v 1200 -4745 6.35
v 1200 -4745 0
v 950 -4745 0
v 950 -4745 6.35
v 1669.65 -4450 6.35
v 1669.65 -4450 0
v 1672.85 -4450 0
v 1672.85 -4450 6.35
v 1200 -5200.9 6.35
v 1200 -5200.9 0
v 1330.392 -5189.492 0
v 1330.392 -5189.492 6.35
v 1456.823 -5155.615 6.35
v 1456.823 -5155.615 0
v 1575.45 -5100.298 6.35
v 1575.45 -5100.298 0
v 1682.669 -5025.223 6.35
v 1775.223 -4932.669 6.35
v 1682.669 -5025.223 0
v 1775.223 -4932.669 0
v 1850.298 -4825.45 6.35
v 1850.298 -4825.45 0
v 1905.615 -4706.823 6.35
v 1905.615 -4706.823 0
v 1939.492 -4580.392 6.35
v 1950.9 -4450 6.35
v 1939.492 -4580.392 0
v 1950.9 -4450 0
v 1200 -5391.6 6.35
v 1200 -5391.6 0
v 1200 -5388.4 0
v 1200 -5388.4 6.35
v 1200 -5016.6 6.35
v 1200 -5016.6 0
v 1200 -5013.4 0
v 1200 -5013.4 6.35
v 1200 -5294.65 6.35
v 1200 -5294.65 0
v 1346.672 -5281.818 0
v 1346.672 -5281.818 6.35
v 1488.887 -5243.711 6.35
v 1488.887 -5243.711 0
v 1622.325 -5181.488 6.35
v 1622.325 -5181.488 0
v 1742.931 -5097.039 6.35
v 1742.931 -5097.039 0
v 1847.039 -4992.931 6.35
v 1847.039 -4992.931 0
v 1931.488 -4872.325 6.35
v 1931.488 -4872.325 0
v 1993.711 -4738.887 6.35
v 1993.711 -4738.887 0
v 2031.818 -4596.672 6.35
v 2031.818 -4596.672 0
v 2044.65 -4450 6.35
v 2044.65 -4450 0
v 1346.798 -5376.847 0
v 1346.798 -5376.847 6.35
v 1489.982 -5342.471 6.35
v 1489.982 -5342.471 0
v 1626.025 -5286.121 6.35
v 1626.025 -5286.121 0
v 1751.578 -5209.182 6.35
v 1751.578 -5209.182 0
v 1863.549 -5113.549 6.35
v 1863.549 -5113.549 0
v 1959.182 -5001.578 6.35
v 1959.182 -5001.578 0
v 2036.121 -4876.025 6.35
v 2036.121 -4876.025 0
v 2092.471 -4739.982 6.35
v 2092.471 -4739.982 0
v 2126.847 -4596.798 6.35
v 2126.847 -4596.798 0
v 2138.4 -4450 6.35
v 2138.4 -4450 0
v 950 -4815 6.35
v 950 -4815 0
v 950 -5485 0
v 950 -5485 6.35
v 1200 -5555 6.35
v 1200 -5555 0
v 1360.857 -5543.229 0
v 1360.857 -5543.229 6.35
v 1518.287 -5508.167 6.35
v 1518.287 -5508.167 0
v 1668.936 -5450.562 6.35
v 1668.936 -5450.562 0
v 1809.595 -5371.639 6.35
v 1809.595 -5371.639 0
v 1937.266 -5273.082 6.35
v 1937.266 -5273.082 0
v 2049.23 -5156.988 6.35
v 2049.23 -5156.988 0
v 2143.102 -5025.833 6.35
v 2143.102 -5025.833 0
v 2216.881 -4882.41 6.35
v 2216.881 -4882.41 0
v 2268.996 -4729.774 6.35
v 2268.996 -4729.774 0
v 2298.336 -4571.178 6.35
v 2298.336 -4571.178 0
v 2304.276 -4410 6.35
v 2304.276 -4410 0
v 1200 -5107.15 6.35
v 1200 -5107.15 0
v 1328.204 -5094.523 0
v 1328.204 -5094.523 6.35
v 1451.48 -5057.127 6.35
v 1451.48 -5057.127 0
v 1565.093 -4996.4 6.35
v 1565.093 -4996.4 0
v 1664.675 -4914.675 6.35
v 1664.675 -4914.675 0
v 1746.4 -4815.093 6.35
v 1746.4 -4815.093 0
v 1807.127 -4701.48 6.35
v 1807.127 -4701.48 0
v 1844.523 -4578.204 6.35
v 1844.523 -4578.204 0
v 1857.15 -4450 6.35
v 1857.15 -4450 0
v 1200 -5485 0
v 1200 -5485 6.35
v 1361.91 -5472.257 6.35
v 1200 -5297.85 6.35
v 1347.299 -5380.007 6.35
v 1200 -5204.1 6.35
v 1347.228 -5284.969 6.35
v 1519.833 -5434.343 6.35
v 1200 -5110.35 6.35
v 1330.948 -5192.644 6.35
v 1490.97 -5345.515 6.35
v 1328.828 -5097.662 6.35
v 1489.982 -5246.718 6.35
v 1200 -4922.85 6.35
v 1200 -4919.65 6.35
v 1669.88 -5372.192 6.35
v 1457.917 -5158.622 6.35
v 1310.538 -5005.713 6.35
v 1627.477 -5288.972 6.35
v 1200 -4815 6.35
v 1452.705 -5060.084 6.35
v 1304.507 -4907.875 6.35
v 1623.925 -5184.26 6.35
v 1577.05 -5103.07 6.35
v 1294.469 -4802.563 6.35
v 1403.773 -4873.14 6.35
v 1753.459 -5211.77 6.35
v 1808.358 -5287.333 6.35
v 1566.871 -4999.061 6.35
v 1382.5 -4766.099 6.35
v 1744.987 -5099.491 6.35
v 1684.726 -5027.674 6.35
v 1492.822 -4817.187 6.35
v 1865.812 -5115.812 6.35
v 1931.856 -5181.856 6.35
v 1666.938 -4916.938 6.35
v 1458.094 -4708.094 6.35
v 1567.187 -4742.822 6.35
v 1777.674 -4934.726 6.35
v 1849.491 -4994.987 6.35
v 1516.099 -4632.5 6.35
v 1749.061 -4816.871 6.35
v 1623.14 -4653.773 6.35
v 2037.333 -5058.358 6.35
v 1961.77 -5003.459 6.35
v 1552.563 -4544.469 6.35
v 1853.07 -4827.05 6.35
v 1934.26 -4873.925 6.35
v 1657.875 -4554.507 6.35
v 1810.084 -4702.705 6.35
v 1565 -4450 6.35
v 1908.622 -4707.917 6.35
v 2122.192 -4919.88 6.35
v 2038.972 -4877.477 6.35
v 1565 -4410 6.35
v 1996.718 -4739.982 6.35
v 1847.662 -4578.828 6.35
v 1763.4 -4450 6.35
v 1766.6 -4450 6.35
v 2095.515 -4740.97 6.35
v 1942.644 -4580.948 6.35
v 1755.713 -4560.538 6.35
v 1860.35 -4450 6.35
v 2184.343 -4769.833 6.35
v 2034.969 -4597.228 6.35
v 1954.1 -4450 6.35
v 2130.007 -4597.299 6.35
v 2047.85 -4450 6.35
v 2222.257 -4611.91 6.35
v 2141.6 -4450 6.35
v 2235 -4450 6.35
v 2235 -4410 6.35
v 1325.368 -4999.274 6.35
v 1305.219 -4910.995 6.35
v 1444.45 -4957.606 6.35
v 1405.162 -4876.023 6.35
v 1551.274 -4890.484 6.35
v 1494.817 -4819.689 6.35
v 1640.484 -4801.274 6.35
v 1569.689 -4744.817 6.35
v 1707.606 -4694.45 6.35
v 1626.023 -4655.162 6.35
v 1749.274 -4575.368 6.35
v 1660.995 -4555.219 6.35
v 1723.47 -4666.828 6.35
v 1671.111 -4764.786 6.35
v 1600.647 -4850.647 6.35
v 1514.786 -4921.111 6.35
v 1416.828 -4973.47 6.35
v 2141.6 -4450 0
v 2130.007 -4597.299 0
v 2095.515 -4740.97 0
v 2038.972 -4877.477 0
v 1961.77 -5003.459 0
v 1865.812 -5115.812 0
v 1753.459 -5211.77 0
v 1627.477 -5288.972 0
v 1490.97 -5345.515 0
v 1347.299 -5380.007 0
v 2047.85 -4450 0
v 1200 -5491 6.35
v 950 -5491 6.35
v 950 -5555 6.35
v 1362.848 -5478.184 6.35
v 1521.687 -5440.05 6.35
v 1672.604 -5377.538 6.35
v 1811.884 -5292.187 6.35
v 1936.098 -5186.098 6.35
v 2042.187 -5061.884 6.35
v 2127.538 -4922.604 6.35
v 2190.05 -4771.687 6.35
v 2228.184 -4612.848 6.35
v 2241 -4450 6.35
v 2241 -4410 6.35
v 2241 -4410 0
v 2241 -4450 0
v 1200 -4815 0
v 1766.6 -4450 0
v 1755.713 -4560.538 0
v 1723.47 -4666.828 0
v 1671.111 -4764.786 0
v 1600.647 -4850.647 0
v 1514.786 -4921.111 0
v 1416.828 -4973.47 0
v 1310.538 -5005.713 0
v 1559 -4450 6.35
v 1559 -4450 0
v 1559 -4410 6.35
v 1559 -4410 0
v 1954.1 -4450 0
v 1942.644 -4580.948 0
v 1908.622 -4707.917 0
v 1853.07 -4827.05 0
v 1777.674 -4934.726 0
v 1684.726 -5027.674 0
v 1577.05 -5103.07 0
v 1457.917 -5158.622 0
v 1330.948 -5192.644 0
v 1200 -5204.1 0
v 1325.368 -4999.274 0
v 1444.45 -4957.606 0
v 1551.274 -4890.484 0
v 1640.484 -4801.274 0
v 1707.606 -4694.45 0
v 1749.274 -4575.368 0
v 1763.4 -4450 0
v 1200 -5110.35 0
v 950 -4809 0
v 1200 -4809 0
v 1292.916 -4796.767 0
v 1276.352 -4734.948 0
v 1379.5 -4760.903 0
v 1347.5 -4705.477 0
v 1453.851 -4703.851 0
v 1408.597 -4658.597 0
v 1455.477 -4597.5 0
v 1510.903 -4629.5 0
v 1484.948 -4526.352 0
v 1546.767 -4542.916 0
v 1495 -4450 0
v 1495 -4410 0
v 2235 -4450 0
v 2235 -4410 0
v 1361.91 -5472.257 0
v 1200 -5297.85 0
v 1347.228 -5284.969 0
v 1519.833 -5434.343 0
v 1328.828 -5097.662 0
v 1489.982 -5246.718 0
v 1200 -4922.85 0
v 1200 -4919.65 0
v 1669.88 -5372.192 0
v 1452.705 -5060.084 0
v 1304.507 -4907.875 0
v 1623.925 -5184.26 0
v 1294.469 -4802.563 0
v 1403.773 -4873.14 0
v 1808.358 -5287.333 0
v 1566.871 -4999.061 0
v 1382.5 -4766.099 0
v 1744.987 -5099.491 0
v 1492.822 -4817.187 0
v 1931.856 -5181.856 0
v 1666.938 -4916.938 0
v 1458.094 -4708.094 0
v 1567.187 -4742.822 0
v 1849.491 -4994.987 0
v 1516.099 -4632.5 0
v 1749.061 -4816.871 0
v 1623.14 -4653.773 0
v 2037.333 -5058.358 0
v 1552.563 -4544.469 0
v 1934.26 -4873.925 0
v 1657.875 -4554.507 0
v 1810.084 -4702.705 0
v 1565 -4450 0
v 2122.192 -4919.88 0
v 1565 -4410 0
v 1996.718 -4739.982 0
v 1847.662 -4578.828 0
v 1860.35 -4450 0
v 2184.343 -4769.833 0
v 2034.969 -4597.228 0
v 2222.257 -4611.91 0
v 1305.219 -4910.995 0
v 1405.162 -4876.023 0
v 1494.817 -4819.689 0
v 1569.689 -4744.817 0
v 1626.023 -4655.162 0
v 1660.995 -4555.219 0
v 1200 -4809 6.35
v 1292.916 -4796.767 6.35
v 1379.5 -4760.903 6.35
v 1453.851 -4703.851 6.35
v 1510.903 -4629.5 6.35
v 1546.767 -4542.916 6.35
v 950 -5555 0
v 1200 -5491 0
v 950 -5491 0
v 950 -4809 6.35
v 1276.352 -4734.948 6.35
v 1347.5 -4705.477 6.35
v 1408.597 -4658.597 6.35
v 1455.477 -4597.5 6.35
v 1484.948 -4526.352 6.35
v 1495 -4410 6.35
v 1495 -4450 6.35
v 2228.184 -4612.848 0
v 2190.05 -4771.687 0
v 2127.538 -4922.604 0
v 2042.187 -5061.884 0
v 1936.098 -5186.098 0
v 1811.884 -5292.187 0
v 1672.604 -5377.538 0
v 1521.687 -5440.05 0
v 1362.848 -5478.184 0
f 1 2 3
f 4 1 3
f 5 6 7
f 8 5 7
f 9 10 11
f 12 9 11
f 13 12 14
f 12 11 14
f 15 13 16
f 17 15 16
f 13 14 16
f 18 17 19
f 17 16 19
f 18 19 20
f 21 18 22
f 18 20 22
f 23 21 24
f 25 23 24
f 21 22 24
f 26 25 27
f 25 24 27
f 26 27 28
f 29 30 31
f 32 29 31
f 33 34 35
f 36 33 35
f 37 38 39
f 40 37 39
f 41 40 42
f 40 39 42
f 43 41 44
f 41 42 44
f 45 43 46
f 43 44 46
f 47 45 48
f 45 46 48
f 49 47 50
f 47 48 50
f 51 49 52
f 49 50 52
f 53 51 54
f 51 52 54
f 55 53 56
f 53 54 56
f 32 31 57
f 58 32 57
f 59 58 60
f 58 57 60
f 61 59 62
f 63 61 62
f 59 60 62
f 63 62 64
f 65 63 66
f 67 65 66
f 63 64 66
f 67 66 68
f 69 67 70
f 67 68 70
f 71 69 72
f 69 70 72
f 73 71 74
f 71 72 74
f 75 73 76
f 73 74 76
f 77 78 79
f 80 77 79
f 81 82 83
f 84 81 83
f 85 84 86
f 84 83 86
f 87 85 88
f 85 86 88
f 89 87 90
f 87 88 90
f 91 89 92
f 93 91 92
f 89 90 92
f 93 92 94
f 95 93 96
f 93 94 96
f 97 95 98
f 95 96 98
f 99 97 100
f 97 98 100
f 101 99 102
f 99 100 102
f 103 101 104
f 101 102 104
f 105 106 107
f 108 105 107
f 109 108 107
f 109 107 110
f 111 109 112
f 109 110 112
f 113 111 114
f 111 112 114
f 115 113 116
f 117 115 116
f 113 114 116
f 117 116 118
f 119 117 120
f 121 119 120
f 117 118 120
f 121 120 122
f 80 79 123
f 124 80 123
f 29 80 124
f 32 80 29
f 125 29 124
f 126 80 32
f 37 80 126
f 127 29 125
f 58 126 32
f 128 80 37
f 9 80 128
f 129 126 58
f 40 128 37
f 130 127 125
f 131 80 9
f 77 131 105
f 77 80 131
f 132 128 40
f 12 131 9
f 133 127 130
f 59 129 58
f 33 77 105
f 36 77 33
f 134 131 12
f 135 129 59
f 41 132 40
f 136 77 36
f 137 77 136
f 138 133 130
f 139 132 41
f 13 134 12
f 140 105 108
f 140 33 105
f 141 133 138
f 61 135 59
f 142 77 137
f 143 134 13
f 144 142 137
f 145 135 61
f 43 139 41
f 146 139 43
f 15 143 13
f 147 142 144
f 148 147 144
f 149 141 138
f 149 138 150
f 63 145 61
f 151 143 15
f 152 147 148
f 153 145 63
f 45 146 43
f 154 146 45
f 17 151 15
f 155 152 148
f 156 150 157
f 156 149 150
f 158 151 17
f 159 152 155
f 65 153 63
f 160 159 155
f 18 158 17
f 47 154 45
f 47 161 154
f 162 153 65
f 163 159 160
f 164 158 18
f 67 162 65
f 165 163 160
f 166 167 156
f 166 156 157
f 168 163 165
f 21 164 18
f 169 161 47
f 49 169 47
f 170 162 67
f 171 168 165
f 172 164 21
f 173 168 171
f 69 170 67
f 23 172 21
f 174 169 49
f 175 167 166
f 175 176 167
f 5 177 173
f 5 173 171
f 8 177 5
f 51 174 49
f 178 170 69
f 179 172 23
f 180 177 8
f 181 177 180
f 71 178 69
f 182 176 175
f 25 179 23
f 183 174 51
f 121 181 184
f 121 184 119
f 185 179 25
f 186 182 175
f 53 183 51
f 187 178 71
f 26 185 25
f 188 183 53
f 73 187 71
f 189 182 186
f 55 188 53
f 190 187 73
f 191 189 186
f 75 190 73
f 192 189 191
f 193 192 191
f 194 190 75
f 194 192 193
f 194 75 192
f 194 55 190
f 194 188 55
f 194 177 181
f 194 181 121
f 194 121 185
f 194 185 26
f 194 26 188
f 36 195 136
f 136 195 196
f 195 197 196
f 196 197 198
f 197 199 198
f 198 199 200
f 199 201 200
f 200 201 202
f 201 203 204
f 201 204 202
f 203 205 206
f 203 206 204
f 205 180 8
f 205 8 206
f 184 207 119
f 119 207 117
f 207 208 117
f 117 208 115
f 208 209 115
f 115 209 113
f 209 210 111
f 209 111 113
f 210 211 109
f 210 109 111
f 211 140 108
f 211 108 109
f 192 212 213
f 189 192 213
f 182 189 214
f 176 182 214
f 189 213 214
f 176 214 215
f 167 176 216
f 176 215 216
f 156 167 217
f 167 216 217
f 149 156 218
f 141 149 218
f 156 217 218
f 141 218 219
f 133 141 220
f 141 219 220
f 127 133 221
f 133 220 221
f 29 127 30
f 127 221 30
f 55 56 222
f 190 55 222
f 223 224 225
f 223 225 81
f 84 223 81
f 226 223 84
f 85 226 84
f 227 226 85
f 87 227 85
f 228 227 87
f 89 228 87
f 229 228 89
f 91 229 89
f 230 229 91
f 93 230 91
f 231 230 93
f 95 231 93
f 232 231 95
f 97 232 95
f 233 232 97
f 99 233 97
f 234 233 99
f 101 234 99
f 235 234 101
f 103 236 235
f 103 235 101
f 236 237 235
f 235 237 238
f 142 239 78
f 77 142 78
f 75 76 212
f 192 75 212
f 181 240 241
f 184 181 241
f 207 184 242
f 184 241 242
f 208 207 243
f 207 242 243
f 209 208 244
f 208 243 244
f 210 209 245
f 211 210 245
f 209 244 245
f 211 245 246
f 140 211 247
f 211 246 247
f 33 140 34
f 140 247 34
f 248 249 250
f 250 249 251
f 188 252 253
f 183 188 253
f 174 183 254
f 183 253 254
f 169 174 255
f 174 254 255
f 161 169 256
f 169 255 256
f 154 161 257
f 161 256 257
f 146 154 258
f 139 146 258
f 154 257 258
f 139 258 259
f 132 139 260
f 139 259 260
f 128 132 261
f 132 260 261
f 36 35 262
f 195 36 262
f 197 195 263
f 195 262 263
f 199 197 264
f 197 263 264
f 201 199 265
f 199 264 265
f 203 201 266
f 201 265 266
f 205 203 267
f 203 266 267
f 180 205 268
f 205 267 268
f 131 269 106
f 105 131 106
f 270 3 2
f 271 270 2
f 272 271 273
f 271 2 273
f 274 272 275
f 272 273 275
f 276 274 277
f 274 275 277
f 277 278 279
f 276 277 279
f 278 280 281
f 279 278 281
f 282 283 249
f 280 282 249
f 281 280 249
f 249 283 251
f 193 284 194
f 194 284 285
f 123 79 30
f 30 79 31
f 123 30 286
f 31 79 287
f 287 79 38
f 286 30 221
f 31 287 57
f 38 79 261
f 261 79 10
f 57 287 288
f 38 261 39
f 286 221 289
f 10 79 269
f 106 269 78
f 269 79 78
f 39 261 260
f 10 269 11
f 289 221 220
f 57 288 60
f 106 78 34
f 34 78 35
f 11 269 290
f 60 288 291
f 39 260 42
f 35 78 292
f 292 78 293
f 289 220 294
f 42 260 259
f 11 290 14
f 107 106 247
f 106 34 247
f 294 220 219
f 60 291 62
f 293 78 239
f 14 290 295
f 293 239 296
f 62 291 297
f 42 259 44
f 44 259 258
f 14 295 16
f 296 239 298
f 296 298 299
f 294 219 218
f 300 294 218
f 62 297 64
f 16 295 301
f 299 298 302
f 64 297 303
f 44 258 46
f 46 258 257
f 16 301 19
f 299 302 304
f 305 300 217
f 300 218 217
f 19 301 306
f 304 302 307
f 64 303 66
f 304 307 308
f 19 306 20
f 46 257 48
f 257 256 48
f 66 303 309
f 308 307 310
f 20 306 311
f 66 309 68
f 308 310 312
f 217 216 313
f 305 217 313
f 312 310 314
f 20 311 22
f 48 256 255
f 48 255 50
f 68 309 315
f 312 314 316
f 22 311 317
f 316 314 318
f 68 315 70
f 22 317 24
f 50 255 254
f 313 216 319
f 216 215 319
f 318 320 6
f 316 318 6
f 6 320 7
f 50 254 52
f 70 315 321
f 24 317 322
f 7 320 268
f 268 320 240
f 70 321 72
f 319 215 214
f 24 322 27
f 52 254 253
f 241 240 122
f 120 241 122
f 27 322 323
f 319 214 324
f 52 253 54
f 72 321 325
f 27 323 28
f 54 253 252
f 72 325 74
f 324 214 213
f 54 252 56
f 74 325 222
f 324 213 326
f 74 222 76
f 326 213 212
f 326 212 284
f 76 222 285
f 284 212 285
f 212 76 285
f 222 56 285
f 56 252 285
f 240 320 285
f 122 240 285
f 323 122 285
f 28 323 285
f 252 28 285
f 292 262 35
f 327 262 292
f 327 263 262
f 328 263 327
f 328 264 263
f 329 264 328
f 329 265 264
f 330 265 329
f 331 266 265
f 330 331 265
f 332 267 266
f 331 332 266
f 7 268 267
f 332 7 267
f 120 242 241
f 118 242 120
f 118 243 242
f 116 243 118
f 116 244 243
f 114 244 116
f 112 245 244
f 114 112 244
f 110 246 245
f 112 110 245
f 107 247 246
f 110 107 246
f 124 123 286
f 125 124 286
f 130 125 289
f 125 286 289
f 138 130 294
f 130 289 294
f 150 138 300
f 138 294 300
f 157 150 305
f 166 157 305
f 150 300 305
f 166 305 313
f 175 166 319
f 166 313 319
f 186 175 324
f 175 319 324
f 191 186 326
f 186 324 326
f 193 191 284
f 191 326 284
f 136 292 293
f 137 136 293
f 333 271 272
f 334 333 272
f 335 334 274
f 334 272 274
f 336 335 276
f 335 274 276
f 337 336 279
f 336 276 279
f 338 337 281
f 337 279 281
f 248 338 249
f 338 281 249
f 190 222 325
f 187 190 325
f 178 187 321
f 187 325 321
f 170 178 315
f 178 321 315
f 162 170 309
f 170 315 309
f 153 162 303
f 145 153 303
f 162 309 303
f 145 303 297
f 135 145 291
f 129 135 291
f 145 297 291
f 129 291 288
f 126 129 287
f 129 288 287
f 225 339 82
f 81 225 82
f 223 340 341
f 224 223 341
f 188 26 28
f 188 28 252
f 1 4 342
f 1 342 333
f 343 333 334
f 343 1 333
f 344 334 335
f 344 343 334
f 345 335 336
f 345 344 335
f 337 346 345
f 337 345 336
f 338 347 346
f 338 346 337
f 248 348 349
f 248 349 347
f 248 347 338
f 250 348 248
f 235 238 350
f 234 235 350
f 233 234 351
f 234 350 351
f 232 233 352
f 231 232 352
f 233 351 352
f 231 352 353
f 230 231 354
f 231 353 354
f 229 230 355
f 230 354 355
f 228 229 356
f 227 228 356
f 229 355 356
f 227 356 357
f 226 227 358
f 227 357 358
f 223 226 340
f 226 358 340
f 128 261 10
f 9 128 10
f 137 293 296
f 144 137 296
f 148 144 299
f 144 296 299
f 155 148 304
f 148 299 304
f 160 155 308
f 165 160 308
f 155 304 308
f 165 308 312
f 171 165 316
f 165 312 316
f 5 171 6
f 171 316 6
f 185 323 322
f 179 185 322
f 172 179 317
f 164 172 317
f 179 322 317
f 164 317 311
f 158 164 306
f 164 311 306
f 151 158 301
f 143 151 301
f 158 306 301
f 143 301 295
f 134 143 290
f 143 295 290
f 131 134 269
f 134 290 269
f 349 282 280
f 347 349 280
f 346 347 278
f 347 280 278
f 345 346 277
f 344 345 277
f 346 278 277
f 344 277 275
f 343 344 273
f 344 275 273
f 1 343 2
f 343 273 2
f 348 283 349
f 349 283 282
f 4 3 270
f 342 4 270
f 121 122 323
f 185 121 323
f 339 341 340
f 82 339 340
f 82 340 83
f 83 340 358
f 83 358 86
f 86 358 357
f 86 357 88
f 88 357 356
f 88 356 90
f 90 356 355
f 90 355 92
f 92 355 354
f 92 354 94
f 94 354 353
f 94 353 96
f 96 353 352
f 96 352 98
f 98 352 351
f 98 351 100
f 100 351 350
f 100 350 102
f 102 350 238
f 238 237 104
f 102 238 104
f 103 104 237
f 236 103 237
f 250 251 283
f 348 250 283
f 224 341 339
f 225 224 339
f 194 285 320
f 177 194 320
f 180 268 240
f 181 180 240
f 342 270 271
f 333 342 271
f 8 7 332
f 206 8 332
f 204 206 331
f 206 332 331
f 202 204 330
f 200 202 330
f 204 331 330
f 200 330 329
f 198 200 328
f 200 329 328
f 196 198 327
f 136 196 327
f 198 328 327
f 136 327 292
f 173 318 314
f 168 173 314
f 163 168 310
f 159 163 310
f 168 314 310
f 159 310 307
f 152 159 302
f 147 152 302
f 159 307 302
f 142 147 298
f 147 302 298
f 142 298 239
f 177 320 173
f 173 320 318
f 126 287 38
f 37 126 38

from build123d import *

# Parameters (mm, degrees)
BOSS_EXTRUDE1_DEPTH   = 6.35
BOSS_EXTRUDE1_2_DEPTH = 6.35
BOSS_EXTRUDE1_3_DEPTH = 6.35


with BuildPart() as part:
    # Sketch1 → Boss-Extrude1 (new body)
    with BuildSketch(Plane.XY):
        with BuildLine():
            Line((1559, -4410), (1495, -4410))
            Line((1495, -4410), (1495, -4450))
            ThreePointArc((1495, -4450), (1408.59650045, -4658.59650045), (1200, -4745))
            Line((1200, -4745), (950, -4745))
            Line((950, -4745), (950, -4809))
            Line((950, -4809), (1200, -4809))
            ThreePointArc((1200, -4809), (1453.851334446, -4703.851334446), (1559, -4450))
            Line((1559, -4450), (1559, -4410))
        make_face()
    extrude(amount=BOSS_EXTRUDE1_DEPTH)


with BuildPart() as body_2:
    # Sketch1 → Boss-Extrude1 2 (new body)
    with BuildSketch(Plane.XY):
        with BuildLine():
            Line((2235, -4410), (1565, -4410))
            Line((1565, -4410), (1565, -4450))
            ThreePointArc((1565, -4450), (1458.093975133, -4708.093975133), (1200, -4815))
            Line((1200, -4815), (950, -4815))
            Line((950, -4815), (950, -5485))
            Line((950, -5485), (1200, -5485))
            ThreePointArc((1200, -5485), (1931.855518528, -5181.855518528), (2235, -4450))
            Line((2235, -4450), (2235, -4410))
        make_face()
        with BuildLine():
            ThreePointArc((1200, -5388.4), (1863.549003465, -5113.549003465), (2138.4, -4450))
            Line((2138.4, -4450), (2141.6, -4450))
            ThreePointArc((2141.6, -4450), (1865.811745165, -5115.811745165), (1200, -5391.6))
            Line((1200, -5391.6), (1200, -5388.4))
        make_face(mode=Mode.SUBTRACT)
        with BuildLine():
            Line((1200, -5297.85), (1200, -5294.65))
            ThreePointArc((1200, -5294.65), (1797.257742729, -5047.257742729), (2044.65, -4450))
            Line((2044.65, -4450), (2047.85, -4450))
            ThreePointArc((2047.85, -4450), (1799.520484429, -5049.520484429), (1200, -5297.85))
        make_face(mode=Mode.SUBTRACT)
        with BuildLine():
            Line((1950.9, -4450), (1954.1, -4450))
            ThreePointArc((1954.1, -4450), (1733.229223693, -4983.229223693), (1200, -5204.1))
            Line((1200, -5204.1), (1200, -5200.9))
            ThreePointArc((1200, -5200.9), (1730.966481993, -4980.966481993), (1950.9, -4450))
        make_face(mode=Mode.SUBTRACT)
        with BuildLine():
            Line((1857.15, -4450), (1860.35, -4450))
            ThreePointArc((1860.35, -4450), (1666.937962957, -4916.937962957), (1200, -5110.35))
            Line((1200, -5110.35), (1200, -5107.15))
            ThreePointArc((1200, -5107.15), (1664.675221257, -4914.675221257), (1857.15, -4450))
        make_face(mode=Mode.SUBTRACT)
        with BuildLine():
            Line((1763.4, -4450), (1766.6, -4450))
            ThreePointArc((1766.6, -4450), (1600.64670222, -4850.64670222), (1200, -5016.6))
            Line((1200, -5016.6), (1200, -5013.4))
            ThreePointArc((1200, -5013.4), (1598.383960521, -4848.383960521), (1763.4, -4450))
        make_face(mode=Mode.SUBTRACT)
        with BuildLine():
            Line((1669.65, -4450), (1672.85, -4450))
            ThreePointArc((1672.85, -4450), (1534.355441484, -4784.355441484), (1200, -4922.85))
            Line((1200, -4922.85), (1200, -4919.65))
            ThreePointArc((1200, -4919.65), (1532.092699784, -4782.092699784), (1669.65, -4450))
        make_face(mode=Mode.SUBTRACT)
    extrude(amount=BOSS_EXTRUDE1_2_DEPTH)


with BuildPart() as body_3:
    # Sketch1 → Boss-Extrude1 3 (new body)
    with BuildSketch(Plane.XY):
        with BuildLine():
            Line((2304.275780772, -4410), (2241, -4410))
            Line((2241, -4410), (2241, -4450))
            ThreePointArc((2241, -4450), (1936.098159215, -5186.098159215), (1200, -5491))
            Line((1200, -5491), (950, -5491))
            Line((950, -5491), (950, -5555))
            Line((950, -5555), (1200, -5555))
            ThreePointArc((1200, -5555), (1995.369411029, -5217.08050425), (2304.275780772, -4410))
        make_face()
    extrude(amount=BOSS_EXTRUDE1_3_DEPTH)


solid = Compound([part.part, body_2.part, body_3.part])
